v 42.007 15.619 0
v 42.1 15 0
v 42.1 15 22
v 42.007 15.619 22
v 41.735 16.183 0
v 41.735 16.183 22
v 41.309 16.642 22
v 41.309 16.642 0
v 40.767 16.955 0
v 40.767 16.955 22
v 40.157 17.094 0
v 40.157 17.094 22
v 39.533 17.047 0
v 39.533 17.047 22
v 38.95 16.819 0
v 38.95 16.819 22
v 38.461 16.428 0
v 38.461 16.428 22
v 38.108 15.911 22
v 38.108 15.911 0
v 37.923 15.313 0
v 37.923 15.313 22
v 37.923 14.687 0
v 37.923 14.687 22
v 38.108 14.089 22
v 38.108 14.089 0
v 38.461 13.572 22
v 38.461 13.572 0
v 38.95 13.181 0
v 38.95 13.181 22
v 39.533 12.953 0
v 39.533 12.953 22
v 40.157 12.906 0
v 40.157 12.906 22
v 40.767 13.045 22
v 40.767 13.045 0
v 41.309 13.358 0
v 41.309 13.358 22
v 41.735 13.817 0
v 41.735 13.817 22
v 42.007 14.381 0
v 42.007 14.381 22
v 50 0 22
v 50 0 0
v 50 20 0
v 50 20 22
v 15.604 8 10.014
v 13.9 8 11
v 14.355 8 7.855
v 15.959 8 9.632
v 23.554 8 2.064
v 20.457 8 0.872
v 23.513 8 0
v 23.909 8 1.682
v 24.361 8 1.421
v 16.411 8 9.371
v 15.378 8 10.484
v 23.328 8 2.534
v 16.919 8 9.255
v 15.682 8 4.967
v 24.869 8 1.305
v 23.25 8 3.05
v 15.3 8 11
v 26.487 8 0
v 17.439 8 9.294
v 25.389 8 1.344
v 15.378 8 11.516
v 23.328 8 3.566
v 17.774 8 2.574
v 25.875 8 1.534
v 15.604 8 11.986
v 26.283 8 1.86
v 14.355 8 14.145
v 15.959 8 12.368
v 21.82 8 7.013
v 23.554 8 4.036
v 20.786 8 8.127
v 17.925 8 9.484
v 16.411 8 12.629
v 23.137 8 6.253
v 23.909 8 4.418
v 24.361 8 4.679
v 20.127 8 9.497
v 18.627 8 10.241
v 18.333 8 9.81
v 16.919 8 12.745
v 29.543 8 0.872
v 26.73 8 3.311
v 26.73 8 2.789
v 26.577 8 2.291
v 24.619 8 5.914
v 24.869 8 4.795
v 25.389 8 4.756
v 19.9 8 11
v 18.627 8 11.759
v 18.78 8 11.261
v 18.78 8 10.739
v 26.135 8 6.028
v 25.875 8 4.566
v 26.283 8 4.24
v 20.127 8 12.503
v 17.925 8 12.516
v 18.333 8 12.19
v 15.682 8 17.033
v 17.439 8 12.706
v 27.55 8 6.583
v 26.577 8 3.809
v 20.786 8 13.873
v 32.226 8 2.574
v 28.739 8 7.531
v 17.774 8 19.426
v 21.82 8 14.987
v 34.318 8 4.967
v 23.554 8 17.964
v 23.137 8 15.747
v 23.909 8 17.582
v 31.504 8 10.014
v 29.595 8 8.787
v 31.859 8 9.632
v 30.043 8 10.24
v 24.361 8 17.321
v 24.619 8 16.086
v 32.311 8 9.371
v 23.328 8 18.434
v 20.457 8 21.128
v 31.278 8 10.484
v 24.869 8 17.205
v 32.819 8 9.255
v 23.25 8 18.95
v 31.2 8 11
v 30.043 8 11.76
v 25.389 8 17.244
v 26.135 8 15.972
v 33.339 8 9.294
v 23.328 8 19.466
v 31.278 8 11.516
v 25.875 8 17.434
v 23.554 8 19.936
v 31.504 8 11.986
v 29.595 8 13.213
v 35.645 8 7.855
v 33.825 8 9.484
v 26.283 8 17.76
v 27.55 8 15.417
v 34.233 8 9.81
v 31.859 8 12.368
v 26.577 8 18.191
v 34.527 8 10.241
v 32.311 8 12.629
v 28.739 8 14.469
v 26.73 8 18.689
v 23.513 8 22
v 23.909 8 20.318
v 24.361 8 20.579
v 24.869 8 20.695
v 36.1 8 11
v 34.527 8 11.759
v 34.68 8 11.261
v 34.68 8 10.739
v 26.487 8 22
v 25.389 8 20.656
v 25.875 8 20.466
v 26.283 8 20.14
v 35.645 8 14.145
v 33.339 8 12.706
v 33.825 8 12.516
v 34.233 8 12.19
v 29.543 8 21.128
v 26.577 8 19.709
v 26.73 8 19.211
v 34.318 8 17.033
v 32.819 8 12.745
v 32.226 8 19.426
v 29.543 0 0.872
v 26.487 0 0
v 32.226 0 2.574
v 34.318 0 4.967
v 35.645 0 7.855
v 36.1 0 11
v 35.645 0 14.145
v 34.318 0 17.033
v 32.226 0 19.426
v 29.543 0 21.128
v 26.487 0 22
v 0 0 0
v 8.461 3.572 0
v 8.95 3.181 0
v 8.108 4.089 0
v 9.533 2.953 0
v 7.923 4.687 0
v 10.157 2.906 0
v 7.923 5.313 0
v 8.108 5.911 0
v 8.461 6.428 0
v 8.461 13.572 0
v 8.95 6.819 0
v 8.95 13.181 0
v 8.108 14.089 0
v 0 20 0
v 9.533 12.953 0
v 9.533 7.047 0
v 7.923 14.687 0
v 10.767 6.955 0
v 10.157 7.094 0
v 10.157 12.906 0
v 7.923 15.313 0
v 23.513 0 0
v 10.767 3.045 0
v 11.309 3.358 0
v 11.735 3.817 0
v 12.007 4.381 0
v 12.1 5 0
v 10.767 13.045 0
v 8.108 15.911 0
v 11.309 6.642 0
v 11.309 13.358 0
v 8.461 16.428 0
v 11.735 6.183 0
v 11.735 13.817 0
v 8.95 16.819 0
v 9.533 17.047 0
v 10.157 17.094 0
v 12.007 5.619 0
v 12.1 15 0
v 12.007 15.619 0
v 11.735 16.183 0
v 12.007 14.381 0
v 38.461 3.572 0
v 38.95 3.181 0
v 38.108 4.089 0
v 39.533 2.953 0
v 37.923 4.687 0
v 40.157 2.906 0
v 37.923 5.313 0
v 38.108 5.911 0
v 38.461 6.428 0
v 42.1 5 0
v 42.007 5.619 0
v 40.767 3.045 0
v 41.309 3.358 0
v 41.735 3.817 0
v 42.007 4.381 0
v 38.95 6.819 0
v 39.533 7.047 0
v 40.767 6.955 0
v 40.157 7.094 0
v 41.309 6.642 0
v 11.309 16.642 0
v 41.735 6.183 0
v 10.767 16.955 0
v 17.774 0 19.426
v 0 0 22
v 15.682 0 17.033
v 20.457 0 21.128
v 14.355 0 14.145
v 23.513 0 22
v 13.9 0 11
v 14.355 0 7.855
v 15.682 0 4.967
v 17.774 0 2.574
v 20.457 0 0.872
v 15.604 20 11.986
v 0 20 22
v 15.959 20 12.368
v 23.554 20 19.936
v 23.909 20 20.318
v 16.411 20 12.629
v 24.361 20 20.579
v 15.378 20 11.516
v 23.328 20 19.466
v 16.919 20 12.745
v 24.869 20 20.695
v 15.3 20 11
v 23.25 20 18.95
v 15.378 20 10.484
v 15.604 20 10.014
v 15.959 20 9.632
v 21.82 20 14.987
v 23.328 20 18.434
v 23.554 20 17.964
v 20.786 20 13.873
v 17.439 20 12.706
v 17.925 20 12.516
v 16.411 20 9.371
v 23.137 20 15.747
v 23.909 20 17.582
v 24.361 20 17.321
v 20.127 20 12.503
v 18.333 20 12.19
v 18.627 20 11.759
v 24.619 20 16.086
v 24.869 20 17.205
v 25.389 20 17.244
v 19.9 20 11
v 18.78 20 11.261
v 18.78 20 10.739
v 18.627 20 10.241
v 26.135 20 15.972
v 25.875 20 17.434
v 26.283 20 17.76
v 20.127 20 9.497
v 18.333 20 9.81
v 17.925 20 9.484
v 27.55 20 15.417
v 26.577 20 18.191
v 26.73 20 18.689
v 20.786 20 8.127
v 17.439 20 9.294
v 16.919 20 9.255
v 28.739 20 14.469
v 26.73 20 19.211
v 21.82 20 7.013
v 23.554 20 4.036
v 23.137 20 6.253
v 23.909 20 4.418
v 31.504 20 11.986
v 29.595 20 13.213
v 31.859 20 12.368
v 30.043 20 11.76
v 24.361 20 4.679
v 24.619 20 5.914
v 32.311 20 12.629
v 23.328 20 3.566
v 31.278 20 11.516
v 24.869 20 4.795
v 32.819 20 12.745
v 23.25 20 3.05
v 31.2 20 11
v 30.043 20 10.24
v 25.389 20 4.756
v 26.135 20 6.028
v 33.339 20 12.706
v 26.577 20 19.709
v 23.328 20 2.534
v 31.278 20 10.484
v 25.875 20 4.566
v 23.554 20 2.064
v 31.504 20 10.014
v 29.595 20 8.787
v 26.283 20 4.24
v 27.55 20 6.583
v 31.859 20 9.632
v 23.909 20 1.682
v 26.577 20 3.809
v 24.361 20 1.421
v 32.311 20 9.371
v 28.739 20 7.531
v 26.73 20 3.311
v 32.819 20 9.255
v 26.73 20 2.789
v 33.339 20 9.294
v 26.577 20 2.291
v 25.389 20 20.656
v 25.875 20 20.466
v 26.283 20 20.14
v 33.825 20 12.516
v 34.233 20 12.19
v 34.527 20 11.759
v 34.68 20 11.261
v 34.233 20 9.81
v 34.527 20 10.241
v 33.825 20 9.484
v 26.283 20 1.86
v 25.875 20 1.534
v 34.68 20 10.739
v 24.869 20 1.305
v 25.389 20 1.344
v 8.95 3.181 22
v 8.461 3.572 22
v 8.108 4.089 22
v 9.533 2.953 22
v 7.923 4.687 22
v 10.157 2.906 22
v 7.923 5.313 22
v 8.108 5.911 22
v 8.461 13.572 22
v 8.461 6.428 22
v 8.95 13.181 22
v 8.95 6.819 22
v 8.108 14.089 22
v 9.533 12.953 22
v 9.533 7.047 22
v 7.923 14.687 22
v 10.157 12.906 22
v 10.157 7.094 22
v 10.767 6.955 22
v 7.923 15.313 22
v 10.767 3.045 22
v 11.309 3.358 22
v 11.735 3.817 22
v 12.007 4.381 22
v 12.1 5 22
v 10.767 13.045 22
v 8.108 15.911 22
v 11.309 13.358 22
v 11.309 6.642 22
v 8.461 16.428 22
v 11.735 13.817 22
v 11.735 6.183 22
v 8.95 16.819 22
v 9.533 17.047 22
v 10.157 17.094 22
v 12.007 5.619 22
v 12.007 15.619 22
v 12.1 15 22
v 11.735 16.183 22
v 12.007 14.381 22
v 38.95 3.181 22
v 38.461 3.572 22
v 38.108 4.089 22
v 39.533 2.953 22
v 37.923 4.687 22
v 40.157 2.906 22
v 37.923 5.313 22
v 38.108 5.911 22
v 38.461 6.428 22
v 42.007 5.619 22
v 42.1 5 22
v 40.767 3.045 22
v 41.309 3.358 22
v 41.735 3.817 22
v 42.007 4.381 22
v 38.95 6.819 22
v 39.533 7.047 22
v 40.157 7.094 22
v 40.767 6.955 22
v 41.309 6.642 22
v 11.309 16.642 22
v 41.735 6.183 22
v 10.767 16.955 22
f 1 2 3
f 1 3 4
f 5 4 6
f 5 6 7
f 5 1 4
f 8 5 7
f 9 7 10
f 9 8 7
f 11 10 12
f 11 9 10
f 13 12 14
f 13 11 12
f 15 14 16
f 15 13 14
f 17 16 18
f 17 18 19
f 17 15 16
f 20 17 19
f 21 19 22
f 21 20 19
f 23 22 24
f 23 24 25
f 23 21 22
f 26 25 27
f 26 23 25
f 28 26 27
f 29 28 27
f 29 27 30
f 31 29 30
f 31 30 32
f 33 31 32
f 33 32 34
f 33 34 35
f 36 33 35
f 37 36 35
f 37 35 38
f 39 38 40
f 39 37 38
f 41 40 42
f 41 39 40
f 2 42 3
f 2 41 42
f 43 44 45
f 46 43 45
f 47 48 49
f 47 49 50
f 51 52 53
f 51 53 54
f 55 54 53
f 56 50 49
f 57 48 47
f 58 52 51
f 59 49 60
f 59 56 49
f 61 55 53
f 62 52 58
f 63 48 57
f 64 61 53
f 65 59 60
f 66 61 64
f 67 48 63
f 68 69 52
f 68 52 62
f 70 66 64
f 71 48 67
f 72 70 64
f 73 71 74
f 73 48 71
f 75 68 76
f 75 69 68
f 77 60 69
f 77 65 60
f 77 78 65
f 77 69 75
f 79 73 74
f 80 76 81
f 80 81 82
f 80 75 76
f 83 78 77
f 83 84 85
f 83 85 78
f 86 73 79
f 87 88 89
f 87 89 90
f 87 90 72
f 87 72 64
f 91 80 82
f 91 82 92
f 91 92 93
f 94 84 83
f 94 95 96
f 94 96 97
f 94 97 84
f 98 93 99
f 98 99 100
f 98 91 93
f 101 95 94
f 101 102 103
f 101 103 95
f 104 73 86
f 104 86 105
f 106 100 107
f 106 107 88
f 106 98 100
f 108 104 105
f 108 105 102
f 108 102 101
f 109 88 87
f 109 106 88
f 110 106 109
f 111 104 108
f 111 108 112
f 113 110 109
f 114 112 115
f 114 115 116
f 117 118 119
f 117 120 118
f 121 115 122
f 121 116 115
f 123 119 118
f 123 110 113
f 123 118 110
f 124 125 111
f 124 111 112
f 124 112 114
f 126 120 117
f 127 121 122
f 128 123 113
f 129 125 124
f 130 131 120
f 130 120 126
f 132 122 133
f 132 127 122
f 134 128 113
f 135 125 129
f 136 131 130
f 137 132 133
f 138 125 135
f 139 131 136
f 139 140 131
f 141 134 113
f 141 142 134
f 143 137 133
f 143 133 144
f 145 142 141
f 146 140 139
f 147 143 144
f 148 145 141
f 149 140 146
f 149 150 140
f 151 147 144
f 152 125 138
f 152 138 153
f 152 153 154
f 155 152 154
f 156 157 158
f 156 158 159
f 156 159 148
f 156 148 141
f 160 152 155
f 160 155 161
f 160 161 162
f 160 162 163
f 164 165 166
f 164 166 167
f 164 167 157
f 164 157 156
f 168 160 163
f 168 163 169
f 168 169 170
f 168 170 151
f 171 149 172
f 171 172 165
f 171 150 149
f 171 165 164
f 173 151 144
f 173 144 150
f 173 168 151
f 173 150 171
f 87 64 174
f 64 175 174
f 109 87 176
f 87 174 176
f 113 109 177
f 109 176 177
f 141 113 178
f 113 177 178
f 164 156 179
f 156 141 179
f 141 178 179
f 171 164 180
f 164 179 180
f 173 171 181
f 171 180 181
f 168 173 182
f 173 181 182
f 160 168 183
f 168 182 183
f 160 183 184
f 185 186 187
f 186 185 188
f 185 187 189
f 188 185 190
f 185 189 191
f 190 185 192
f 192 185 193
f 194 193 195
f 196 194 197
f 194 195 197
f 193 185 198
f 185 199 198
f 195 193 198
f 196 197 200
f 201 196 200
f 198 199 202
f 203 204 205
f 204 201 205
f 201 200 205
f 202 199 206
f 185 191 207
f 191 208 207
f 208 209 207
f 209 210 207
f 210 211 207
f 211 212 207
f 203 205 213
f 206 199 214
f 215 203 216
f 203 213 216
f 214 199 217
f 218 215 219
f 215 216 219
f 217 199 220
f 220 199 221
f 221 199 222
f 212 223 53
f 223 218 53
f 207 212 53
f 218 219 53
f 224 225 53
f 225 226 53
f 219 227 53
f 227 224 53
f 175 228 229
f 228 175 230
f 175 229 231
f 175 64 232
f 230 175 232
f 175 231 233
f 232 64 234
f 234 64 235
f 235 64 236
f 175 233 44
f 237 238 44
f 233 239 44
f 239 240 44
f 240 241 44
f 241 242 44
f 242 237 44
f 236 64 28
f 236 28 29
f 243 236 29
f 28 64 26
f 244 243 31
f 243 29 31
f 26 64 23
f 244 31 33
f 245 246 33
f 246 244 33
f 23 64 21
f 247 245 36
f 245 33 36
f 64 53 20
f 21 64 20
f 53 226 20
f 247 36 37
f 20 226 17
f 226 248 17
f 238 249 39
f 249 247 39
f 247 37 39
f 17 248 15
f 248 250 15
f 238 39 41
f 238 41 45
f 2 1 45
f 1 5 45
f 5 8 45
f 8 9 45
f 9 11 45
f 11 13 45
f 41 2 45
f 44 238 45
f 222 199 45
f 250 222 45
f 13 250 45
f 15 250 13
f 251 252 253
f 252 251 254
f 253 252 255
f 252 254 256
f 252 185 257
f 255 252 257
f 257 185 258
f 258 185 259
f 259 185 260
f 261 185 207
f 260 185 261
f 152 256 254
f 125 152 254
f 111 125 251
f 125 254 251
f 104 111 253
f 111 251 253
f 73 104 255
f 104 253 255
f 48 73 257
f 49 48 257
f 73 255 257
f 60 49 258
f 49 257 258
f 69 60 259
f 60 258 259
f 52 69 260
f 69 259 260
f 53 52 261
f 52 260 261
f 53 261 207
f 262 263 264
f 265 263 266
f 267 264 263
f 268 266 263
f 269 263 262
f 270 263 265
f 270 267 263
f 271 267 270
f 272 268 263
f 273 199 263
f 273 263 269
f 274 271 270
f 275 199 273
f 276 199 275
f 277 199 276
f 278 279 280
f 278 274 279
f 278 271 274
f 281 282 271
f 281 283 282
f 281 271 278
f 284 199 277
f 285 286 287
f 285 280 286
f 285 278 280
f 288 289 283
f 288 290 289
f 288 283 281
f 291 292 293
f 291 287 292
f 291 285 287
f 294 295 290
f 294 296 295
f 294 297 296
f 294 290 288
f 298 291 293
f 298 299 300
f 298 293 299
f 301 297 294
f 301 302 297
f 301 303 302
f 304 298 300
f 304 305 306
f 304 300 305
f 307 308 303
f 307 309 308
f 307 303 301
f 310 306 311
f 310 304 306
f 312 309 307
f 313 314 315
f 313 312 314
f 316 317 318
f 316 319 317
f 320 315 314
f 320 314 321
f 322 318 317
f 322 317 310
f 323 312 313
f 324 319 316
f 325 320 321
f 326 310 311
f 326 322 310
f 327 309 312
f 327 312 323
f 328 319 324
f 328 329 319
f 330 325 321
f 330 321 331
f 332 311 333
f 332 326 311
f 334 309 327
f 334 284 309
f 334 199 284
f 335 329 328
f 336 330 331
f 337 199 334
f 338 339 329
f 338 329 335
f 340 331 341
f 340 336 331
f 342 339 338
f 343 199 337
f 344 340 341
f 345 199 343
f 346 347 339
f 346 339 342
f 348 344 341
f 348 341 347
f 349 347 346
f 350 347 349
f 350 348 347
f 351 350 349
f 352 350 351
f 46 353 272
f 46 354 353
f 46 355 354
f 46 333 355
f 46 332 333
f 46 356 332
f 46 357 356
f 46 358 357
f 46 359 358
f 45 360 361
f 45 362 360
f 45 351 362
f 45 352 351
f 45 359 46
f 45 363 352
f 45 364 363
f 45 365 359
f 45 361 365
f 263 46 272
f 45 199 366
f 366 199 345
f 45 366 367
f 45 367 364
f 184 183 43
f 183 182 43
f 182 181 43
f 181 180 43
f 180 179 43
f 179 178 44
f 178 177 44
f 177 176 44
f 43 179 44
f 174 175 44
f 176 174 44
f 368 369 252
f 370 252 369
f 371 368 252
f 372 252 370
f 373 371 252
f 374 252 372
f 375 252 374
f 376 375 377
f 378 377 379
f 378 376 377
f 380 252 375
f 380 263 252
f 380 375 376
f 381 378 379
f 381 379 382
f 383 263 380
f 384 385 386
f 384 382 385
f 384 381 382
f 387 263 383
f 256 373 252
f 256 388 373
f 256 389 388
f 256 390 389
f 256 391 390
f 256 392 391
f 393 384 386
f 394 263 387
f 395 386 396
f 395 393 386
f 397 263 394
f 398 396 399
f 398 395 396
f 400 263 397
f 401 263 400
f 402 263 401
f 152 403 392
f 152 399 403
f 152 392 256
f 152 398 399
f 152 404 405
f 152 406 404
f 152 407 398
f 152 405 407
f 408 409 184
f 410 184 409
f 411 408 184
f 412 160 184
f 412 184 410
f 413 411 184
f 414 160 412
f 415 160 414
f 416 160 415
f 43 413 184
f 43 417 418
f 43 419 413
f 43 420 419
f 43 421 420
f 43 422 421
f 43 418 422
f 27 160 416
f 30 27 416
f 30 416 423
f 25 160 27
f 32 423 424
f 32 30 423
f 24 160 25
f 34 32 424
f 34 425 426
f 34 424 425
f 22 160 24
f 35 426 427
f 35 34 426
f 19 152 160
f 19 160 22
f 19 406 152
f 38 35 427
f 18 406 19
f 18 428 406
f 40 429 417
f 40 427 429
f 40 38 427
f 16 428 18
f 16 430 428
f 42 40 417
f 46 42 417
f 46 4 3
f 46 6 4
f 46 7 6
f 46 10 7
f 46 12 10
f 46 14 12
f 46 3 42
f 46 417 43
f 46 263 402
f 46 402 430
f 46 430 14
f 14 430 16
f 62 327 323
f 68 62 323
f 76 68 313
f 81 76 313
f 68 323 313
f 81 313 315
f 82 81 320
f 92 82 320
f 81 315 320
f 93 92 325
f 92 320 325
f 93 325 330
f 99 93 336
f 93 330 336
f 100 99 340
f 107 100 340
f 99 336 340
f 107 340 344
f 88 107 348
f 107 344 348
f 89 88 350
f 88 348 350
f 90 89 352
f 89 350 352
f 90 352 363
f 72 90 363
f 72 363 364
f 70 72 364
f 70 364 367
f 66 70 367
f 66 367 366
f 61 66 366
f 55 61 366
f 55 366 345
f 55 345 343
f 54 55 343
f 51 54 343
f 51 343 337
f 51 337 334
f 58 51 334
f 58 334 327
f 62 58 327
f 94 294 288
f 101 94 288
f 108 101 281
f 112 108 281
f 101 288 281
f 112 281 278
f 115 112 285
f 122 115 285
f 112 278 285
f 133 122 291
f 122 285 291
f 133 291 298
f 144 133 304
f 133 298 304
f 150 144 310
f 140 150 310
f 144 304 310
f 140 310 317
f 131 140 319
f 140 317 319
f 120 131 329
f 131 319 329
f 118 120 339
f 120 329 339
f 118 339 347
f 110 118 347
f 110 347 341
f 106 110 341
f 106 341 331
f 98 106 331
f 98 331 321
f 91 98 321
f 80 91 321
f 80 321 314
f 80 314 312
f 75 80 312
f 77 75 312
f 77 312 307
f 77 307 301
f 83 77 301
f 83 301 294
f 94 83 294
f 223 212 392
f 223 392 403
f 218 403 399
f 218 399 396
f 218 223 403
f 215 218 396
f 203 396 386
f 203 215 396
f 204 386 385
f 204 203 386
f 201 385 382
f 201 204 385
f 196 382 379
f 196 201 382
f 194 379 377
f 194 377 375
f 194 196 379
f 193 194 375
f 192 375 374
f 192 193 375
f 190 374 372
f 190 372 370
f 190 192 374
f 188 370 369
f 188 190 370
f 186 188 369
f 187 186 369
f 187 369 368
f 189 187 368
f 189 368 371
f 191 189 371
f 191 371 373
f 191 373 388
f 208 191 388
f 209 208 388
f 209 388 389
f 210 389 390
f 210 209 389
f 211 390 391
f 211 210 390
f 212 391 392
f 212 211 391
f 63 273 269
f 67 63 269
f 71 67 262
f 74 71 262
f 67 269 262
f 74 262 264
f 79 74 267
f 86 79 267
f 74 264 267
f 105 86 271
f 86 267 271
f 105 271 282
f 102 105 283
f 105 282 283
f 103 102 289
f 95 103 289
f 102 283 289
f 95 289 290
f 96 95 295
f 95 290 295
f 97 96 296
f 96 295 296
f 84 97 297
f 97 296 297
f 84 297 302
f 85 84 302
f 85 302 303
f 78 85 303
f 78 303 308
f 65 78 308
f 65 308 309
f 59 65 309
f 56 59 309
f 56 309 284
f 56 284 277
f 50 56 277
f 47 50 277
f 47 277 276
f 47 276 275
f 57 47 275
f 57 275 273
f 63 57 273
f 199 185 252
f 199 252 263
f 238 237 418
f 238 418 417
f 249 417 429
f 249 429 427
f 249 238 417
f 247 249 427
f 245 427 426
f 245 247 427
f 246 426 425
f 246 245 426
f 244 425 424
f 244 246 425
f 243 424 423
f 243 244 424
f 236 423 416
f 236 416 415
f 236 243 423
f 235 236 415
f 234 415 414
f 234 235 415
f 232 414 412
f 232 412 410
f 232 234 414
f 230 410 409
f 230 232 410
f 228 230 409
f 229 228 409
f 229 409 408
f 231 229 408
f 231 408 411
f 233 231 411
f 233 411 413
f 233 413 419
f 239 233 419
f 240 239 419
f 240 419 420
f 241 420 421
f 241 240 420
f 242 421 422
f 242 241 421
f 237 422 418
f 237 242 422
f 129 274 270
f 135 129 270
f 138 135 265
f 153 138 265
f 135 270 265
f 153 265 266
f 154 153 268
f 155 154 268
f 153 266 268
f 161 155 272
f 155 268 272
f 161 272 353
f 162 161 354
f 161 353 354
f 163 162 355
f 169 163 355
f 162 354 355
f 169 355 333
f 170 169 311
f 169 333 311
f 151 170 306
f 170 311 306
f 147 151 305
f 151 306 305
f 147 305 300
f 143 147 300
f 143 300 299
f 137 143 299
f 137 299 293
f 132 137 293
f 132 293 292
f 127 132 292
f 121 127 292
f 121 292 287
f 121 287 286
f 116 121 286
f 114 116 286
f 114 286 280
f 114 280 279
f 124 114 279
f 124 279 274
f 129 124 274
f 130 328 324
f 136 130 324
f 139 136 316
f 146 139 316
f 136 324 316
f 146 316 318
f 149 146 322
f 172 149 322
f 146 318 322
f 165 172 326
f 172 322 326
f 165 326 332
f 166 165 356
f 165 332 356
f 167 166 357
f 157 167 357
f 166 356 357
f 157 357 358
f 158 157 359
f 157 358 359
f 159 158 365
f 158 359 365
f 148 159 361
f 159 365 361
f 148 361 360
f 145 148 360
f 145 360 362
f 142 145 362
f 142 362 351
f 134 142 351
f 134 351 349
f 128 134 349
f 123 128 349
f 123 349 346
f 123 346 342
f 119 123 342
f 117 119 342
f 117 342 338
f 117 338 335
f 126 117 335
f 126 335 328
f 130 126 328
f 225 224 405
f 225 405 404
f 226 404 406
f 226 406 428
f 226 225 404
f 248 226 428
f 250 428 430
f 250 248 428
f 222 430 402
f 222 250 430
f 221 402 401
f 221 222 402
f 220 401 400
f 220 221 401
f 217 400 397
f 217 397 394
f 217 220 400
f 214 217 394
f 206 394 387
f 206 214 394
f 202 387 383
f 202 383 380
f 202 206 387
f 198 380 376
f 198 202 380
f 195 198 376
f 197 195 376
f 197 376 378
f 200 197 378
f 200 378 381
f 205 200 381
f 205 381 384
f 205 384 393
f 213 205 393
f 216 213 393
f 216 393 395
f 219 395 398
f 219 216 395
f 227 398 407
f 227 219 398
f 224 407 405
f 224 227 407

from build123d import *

# Parameters (mm, degrees)
SKETCH_W        = 50
SKETCH_H        = 20
SKETCH_R        = 2.1
PAD_DEPTH       = 22
SKETCH001_R     = 11.1
POCKET_DEPTH    = 8
SKETCH002_R     = 5.1
SKETCH002_R_2   = 1.75
POCKET001_DEPTH = 20


with BuildPart() as part:
    # Sketch → Pad (new body)
    with BuildSketch(Plane.XY):
        with Locations((25, 10)):
            Rectangle(SKETCH_W, SKETCH_H)
        with Locations((10, 15)):
            Circle(SKETCH_R, mode=Mode.SUBTRACT)
        with Locations((10, 5)):
            Circle(SKETCH_R, mode=Mode.SUBTRACT)
        with Locations((40, 15)):
            Circle(SKETCH_R, mode=Mode.SUBTRACT)
        with Locations((40, 5)):
            Circle(SKETCH_R, mode=Mode.SUBTRACT)
    extrude(amount=PAD_DEPTH)

    # Sketch001 (on Face3 of Pad) → Pocket (cut)
    with BuildSketch(Plane.XZ):
        with Locations((25, 11)):
            Circle(SKETCH001_R)
    extrude(amount=-POCKET_DEPTH, mode=Mode.SUBTRACT)

    # Sketch002 (on Face1 of Pocket) → Pocket001 (cut)
    with BuildSketch(Plane(origin=(0, 20, 0), x_dir=(-1, 0, 0), z_dir=(0, 1, 0))):
        with Locations((-25, 11)):
            Circle(SKETCH002_R)
        with Locations((-25, 18.95)):
            Circle(SKETCH002_R_2)
        with Locations((-25, 3.05)):
            Circle(SKETCH002_R_2)
        with Locations((-32.95, 11)):
            Circle(SKETCH002_R_2)
        with Locations((-17.05, 11)):
            Circle(SKETCH002_R_2)
    extrude(amount=-POCKET001_DEPTH, mode=Mode.SUBTRACT)


solid = part.part
